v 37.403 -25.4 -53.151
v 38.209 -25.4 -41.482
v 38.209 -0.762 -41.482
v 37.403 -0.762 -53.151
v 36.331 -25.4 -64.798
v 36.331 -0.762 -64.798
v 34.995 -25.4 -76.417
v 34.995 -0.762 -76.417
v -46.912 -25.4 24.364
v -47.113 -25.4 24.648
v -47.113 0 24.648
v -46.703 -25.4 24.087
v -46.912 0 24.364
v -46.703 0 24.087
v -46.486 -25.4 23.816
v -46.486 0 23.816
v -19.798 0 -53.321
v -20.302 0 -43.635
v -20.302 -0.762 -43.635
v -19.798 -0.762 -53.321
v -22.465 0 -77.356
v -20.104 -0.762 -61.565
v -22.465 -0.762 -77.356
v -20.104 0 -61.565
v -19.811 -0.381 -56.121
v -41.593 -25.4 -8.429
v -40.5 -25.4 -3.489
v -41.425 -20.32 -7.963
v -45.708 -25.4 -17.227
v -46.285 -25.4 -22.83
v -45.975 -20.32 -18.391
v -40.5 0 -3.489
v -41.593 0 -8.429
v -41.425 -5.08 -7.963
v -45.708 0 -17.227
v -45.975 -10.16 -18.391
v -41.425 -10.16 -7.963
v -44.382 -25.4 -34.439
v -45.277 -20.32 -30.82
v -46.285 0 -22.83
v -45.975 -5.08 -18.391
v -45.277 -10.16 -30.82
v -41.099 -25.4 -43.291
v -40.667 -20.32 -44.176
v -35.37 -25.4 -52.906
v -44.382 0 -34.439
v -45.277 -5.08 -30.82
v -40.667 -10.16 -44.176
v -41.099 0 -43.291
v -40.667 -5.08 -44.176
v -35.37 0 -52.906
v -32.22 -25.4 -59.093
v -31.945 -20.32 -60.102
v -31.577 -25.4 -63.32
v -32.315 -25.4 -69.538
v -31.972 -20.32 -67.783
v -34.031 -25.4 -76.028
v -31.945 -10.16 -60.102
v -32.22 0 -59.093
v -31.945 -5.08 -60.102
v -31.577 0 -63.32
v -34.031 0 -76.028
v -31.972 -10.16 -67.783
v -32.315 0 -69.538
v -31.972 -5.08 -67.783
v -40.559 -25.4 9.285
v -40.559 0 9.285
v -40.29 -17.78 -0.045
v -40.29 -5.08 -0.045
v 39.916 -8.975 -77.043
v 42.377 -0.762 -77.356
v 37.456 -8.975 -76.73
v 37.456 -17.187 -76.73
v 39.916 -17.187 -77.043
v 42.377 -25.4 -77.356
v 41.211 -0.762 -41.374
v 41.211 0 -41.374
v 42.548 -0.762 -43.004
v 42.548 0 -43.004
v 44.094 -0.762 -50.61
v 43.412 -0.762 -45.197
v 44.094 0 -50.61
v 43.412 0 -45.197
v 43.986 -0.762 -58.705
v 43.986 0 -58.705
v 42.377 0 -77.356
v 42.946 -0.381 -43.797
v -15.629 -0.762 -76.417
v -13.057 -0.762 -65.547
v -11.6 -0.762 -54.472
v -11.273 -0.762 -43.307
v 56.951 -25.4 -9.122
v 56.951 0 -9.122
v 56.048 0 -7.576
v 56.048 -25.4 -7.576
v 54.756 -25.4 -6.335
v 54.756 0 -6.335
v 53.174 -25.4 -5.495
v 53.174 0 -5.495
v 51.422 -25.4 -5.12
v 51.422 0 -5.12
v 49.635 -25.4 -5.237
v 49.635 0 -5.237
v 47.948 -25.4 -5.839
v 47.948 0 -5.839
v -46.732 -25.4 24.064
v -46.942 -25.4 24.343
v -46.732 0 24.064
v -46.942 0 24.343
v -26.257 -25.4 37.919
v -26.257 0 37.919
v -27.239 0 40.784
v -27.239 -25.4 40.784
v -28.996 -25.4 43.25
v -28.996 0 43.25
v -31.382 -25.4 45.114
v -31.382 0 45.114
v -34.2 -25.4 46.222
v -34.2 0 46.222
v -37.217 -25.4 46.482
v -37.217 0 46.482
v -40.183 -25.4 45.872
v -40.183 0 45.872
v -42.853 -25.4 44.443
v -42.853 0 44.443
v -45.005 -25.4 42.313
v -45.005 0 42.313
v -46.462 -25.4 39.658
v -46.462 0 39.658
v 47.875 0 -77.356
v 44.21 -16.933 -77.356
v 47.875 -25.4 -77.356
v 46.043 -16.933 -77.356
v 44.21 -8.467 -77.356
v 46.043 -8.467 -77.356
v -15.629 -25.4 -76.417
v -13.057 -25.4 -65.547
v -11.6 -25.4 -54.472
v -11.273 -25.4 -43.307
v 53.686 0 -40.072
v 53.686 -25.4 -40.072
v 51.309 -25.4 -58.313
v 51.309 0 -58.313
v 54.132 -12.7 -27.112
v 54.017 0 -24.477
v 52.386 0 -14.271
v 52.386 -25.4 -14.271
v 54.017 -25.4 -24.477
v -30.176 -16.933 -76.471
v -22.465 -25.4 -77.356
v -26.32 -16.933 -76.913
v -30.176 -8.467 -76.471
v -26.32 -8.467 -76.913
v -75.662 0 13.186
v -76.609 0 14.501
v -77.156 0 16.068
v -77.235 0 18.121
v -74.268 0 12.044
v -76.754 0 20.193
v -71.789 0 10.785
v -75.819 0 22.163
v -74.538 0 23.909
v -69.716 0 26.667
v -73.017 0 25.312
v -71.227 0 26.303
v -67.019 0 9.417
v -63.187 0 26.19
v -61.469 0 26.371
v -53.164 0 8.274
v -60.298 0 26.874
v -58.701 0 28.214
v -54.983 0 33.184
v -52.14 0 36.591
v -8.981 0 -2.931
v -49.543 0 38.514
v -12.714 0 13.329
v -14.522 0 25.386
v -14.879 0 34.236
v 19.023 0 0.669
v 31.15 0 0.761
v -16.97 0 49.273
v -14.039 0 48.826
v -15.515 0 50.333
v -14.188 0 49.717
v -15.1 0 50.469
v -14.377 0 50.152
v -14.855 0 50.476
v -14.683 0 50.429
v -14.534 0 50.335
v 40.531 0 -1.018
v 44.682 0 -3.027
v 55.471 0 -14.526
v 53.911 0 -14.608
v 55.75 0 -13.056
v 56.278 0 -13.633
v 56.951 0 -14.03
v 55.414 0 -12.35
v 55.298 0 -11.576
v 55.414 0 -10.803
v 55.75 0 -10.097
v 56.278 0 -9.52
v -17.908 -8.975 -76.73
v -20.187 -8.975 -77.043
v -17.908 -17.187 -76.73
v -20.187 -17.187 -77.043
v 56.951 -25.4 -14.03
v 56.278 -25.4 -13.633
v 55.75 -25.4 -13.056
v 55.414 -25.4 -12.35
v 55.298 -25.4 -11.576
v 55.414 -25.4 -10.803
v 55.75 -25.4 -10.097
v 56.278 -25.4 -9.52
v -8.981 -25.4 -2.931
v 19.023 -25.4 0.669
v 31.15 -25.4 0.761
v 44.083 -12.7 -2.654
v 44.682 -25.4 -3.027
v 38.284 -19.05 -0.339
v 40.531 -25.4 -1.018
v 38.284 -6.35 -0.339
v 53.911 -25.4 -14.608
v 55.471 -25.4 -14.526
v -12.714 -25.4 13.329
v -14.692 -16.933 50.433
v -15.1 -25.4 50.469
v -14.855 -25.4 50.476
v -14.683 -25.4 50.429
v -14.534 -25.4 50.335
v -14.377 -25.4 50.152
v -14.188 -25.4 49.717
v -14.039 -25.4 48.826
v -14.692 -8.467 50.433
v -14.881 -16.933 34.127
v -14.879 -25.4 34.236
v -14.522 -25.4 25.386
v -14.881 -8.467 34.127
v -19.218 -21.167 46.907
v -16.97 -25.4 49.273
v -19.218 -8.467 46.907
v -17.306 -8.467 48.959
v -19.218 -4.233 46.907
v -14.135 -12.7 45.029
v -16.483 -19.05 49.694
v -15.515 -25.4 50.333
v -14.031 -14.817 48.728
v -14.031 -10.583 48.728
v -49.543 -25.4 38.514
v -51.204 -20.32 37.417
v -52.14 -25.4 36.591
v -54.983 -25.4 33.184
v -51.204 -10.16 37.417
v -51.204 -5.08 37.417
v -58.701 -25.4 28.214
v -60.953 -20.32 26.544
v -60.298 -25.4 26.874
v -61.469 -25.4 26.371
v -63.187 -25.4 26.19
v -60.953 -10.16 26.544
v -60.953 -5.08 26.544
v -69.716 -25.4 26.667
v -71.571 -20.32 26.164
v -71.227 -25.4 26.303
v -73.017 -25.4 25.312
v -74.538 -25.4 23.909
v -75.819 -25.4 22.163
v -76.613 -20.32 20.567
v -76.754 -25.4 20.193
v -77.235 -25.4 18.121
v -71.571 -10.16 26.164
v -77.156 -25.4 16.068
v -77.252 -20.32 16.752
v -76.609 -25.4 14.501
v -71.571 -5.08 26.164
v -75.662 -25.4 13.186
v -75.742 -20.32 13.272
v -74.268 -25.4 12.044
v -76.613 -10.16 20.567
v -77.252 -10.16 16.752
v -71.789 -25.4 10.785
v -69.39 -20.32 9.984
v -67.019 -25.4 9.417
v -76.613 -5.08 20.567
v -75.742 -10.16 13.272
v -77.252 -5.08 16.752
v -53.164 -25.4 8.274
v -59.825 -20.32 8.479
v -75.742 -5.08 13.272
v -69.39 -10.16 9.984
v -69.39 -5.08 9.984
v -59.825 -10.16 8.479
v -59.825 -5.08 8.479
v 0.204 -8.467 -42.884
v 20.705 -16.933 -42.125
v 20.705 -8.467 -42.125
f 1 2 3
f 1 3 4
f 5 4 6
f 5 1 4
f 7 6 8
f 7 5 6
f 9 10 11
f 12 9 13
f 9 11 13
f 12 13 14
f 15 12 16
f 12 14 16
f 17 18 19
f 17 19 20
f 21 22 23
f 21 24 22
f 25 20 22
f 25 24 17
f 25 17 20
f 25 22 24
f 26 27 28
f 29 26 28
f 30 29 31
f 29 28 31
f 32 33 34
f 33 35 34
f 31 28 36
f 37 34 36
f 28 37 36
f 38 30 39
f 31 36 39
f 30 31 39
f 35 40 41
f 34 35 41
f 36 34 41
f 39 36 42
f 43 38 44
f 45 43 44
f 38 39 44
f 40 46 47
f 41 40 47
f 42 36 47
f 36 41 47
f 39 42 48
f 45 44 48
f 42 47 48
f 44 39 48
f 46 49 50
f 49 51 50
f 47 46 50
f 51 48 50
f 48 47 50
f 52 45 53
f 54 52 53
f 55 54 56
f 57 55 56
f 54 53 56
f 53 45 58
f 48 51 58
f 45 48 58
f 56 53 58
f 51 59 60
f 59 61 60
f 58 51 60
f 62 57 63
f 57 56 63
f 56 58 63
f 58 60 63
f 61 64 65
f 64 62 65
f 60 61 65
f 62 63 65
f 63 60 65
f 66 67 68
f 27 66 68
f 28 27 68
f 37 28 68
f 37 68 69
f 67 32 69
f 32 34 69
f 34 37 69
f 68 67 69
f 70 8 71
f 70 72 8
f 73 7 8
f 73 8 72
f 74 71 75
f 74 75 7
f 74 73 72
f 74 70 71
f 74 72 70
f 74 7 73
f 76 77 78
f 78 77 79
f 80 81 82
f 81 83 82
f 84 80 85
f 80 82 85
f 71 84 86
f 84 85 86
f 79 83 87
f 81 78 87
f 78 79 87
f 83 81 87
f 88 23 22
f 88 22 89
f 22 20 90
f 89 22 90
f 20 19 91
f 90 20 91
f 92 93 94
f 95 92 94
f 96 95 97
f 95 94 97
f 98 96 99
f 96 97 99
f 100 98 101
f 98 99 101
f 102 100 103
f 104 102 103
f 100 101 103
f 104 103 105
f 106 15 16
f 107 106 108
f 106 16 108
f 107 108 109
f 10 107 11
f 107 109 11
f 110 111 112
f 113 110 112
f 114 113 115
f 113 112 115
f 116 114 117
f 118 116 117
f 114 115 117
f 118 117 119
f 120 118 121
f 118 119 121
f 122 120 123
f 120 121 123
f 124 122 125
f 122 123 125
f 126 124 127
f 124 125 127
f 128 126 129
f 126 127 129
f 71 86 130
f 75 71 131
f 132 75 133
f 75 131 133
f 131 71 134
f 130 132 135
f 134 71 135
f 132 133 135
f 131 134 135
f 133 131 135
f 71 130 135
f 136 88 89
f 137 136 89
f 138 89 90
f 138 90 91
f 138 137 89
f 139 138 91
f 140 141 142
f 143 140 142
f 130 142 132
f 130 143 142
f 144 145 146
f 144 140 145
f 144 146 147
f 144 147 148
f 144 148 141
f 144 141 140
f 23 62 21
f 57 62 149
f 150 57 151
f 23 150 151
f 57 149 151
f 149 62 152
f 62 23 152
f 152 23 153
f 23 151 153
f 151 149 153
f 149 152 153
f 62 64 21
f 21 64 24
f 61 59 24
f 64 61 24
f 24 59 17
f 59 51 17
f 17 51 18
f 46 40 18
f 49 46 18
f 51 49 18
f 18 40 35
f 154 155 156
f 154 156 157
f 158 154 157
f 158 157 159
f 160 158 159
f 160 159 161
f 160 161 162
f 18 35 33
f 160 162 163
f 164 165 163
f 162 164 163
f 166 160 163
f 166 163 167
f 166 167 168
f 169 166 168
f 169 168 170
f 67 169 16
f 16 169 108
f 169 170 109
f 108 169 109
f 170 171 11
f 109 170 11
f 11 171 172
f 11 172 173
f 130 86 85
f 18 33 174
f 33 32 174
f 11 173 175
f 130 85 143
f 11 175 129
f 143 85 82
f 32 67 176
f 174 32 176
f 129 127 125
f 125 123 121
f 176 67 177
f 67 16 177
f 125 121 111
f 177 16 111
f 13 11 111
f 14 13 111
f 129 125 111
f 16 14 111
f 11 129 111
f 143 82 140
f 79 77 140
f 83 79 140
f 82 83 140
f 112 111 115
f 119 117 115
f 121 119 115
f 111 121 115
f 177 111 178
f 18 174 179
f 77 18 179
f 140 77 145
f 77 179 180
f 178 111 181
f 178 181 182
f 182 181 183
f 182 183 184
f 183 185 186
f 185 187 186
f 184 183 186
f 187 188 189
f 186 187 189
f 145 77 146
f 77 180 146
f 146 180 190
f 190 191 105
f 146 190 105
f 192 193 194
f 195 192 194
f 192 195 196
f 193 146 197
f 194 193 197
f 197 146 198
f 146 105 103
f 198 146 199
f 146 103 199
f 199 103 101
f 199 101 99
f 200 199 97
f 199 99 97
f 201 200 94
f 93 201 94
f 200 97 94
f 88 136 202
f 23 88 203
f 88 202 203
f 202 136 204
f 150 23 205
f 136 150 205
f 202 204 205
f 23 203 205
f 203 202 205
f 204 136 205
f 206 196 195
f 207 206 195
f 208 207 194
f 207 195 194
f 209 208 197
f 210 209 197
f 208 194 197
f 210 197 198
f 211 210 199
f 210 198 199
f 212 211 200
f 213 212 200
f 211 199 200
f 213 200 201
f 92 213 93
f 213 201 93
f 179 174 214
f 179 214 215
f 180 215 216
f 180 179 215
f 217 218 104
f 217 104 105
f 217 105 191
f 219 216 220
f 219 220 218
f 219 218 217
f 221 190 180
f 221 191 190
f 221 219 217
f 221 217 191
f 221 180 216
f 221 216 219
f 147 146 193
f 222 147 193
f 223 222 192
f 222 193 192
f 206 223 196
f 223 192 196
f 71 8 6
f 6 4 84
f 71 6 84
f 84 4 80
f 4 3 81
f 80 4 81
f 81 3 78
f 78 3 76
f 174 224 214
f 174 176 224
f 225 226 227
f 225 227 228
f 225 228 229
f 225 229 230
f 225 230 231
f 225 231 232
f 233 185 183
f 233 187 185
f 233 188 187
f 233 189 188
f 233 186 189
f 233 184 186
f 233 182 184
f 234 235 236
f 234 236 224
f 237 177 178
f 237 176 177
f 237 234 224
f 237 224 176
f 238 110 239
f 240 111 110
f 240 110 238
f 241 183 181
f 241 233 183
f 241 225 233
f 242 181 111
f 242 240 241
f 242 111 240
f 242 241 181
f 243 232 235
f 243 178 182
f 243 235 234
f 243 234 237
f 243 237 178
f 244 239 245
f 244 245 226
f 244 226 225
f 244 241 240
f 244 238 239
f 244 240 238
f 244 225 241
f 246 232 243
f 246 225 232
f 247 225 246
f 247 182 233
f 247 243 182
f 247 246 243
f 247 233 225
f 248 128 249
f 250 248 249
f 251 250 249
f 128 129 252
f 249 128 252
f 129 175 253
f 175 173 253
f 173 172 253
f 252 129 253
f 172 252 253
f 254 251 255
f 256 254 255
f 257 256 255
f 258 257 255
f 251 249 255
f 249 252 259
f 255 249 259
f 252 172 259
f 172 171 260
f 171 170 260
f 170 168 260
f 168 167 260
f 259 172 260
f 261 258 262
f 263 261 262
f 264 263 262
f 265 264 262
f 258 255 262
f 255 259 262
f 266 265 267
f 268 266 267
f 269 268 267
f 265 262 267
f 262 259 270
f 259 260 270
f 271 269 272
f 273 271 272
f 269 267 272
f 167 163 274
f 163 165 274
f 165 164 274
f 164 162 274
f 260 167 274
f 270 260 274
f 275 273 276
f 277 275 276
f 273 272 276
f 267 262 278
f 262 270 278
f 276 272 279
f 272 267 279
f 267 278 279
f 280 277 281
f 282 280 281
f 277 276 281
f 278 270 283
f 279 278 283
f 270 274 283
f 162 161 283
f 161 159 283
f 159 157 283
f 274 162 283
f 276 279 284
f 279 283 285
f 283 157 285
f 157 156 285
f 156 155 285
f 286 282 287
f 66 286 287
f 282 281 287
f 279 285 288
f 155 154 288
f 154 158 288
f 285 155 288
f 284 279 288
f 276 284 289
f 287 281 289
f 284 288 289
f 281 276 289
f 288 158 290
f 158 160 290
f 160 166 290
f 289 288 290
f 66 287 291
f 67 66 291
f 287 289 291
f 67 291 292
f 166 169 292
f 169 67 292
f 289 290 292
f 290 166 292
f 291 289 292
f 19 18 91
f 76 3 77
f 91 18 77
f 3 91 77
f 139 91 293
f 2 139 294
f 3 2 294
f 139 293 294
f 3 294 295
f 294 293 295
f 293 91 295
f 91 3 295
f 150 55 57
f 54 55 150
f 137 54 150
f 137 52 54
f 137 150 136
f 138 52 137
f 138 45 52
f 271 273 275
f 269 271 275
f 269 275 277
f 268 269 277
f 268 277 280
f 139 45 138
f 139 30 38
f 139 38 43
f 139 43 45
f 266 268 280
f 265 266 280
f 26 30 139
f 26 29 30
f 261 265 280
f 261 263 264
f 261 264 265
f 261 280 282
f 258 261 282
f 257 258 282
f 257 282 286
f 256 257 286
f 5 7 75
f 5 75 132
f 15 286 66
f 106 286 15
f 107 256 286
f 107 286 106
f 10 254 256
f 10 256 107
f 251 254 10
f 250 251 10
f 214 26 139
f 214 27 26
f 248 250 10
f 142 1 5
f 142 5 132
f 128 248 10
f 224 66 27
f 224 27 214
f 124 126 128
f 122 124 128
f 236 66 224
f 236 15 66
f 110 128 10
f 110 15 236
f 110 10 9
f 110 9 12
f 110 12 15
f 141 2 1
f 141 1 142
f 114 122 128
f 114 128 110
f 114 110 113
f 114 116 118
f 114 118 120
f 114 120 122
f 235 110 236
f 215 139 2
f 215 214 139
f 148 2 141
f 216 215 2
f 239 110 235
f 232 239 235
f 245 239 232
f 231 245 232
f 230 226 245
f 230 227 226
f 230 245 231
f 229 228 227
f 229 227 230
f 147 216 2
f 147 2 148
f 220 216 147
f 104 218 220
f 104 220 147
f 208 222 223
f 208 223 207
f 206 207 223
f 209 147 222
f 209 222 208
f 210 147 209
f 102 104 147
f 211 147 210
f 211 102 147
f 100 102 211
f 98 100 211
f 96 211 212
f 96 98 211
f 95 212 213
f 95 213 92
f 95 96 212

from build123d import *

# Parameters (mm, degrees)
F1_DEPTH = 25.4
F3_DEPTH = 24.638


with BuildPart() as f1:
    # F0 (on Front) → F1 (new body)
    with BuildSketch(Plane.XZ):
        with BuildLine():
            ThreePointArc((-46.4862426009, 23.8157141108), (-29.8551050215, 21.5207532176), (-26.2572001666, 37.9194319248))
            add(Edge.make_bspline(
                [(-26.2572001666, 37.9194319248), (-33.5785732102, 39.4513797897), (-40.8999462537, 40.9833276545), (-46.4622259382, 39.6582663738)],
                knots=[0, 0, 0, 0, 0.1645686981, 0.1645686981, 0.1645686981, 0.1645686981], degree=3))
            ThreePointArc((-46.4622259382, 39.6582663738), (-46.7732025891, 33.2630857663), (-43.3209426701, 27.8707817197))
            ThreePointArc((-43.3209426701, 27.8707817197), (-42.75295438, 24.1645052215), (-46.4862426009, 23.8157141108))
        make_face()
        with BuildLine():
            add(Edge.make_bspline(
                [(-26.2572001666, 37.9194319248), (-33.5785732102, 39.4513797897), (-40.8999462537, 40.9833276545), (-46.4622259382, 39.6582663738)],
                knots=[0, 0, 0, 0, 0.1645686981, 0.1645686981, 0.1645686981, 0.1645686981], degree=3))
            ThreePointArc((-26.2572001666, 37.9194319248), (-35.699445364, 46.4610721536), (-46.4622259382, 39.6582663738))
        make_face()
        with BuildLine():
            add(Edge.make_bspline(
                [(-26.2572001666, 37.9194319248), (-21.2848663216, 44.5178757287), (-11.4483296844, 57.5712700198), (-17.1229667839, 30.8499658929), (-12.1318281567, 9.7139809287), (-8.9813978684, -2.9307255803)],
                knots=[0, 0, 0, 0, 0.2852219899, 0.5642413886, 0.9762354153, 0.9762354153, 0.9762354153, 0.9762354153], degree=3))
            ThreePointArc((-26.2572001666, 37.9194319248), (-29.8551050215, 21.5207532176), (-46.4862426009, 23.8157141108))
            ThreePointArc((-46.4862426009, 23.8157141108), (-42.75295438, 24.1645052215), (-43.3209426701, 27.8707817197))
            ThreePointArc((-43.3209426701, 27.8707817197), (-46.7732025891, 33.2630857663), (-46.4622259382, 39.6582663738))
            add(Edge.make_bspline(
                [(-46.4622259382, 39.6582663738), (-47.9546637508, 39.3027338096), (-54.4687249908, 36.6260590315), (-59.204777521, 22.3686329219), (-72.3635551118, 30.541434958), (-84.8045836551, 7.5055250894), (-50.2965651717, 7.5626151235), (-40.5588783311, 9.284645475)],
                knots=[0.1645686981, 0.1645686981, 0.1645686981, 0.1645686981, 0.2087247926, 0.3751678059, 0.5132702951, 0.669236946, 0.8887619241, 0.8887619241, 0.8887619241, 0.8887619241], degree=3))
            add(Edge.make_bspline(
                [(-40.5588783311, 9.284645475), (-40.2244215579, 2.9095372853), (-39.6152527774, -8.6489043019), (-48.9282482124, -17.6683761849), (-42.4825879873, -45.6063545007), (-29.1342983998, -58.9969255104), (-32.432355946, -70.4688856478), (-34.0306833386, -76.0284587741)],
                knots=[0, 0, 0, 0, 0.1985639192, 0.3597333515, 0.6048956396, 0.8085027208, 1, 1, 1, 1], degree=3))
            add(Edge.make_bspline(
                [(-34.0306833386, -76.0284587741), (-30.1755412171, -76.4708518982), (-26.3203990956, -76.9132450223), (-22.4652569741, -77.3556381464)],
                knots=[0, 0, 0, 0, 11.6413269037, 11.6413269037, 11.6413269037, 11.6413269037], degree=3))
            add(Edge.make_bspline(
                [(-20.3018153965, -43.6350402281), (-19.9338059871, -47.9677109939), (-19.3292219931, -60.3156512029), (-21.2182682476, -70.5799893582), (-22.4652569741, -77.3556381464)],
                knots=[0.3055460212, 0.3055460212, 0.3055460212, 0.3055460212, 0.5415801595, 1, 1, 1, 1], degree=3))
            add(Edge.make_bspline(
                [(-20.3018153965, -43.6350402281), (0.2083386626, -42.8949527825), (20.7004662969, -42.113893037), (41.2106203561, -41.3738055914)],
                knots=[0, 0, 0, 0, 61.5539839027, 61.5539839027, 61.5539839027, 61.5539839027], degree=3))
            add(Edge.make_bspline(
                [(41.2106203561, -41.3738055914), (41.8876965674, -42.0052244917), (45.5136908231, -46.3501180704), (43.8031563705, -63.2582394955), (42.3769727349, -77.3556381464)],
                knots=[0.4245594021, 0.4245594021, 0.4245594021, 0.4245594021, 0.5202178111, 1, 1, 1, 1], degree=3))
            add(Edge.make_bspline(
                [(42.3769727349, -77.3556381464), (44.2097435395, -77.3556381464), (46.0425143441, -77.3556381464), (47.8752851486, -77.3556381464)],
                knots=[0, 0, 0, 0, 5.4983124137, 5.4983124137, 5.4983124137, 5.4983124137], degree=3))
            add(Edge.make_bspline(
                [(52.3864964181, -14.2706181318), (53.5131222585, -18.0947594075), (55.5788689173, -36.43703812), (51.206238736, -59.6640147088), (47.8752851486, -77.3556381464)],
                knots=[0.5220036326, 0.5220036326, 0.5220036326, 0.5220036326, 0.6358895624, 1, 1, 1, 1], degree=3))
            ThreePointArc((52.3864964181, -14.2706181318), (49.1690411166, -11.3433428892), (48.897415601, -7.0020091607))
            add(Edge.make_bspline(
                [(47.9479525169, -5.8392007163), (48.2807380693, -6.2122010878), (48.5969884032, -6.6000410714), (48.897415601, -7.0020091607)],
                knots=[0.4248007478, 0.4248007478, 0.4248007478, 0.4248007478, 0.4405556349, 0.4405556349, 0.4405556349, 0.4405556349], degree=3))
            add(Edge.make_bspline(
                [(-8.9813978684, -2.9307255803), (12.2262396811, 0.3668984768), (36.4031082958, 4.128462424), (46.8487158168, -4.6071289077), (47.9479525169, -5.8392007163)],
                knots=[0, 0, 0, 0, 0.372760177, 0.4248007478, 0.4248007478, 0.4248007478, 0.4248007478], degree=3))
        make_face()
        with BuildLine():
            ThreePointArc((-47.1128895879, 24.6476288885), (-46.8083266273, 24.2250725526), (-46.4862426009, 23.8157141108))
            ThreePointArc((-46.4862426009, 23.8157141108), (-46.8420398942, 24.1996777433), (-47.1128895879, 24.6476288885))
        make_face(mode=Mode.SUBTRACT)
        with BuildLine():
            ThreePointArc((56.9514993654, -9.1224809065), (53.1738513822, -5.4951140517), (47.9479525169, -5.8392007163))
            add(Edge.make_bspline(
                [(47.9479525169, -5.8392007163), (48.2807380693, -6.2122010878), (48.5969884032, -6.6000410714), (48.897415601, -7.0020091607)],
                knots=[0.4248007478, 0.4248007478, 0.4248007478, 0.4248007478, 0.4405556349, 0.4405556349, 0.4405556349, 0.4405556349], degree=3))
            add(Edge.make_bspline(
                [(48.897415601, -7.0020091607), (50.4505332837, -9.0800625191), (51.580765464, -11.5357003907), (52.3864964181, -14.2706181318)],
                knots=[0.4405556349, 0.4405556349, 0.4405556349, 0.4405556349, 0.5220036326, 0.5220036326, 0.5220036326, 0.5220036326], degree=3))
            ThreePointArc((52.3864964181, -14.2706181318), (54.6937283173, -14.6199582074), (56.9514993654, -14.0301892534))
            ThreePointArc((56.9514993654, -14.0301892534), (55.2984202513, -11.5763350799), (56.9514993654, -9.1224809065))
        make_face()
        with BuildLine():
            add(Edge.make_bspline(
                [(48.897415601, -7.0020091607), (50.4505332837, -9.0800625191), (51.580765464, -11.5357003907), (52.3864964181, -14.2706181318)],
                knots=[0.4405556349, 0.4405556349, 0.4405556349, 0.4405556349, 0.5220036326, 0.5220036326, 0.5220036326, 0.5220036326], degree=3))
            ThreePointArc((48.897415601, -7.0020091607), (49.1690411166, -11.3433428892), (52.3864964181, -14.2706181318))
        make_face()
    extrude(amount=F1_DEPTH)

    # F2 (on face) → F3 (join)
    with BuildSketch(Plane.XZ.offset(25.4)):
        with BuildLine():
            ThreePointArc((-15.6290009618, -76.417055522), (-12.187807166, -60.0281077199), (-11.2726572913, -43.3068061704))
            add(Edge.make_bspline(
                [(-20.3018153965, -43.6350402281), (-17.2917457537, -43.526425015), (-14.2820643728, -43.4169273205), (-11.2726572913, -43.3068061704)],
                knots=[0, 0, 0, 0, 9.0336609762, 9.0336609762, 9.0336609762, 9.0336609762], degree=3))
            add(Edge.make_bspline(
                [(-20.3018153965, -43.6350402281), (-19.9338059871, -47.9677109939), (-19.3292219931, -60.3156512029), (-21.2182682476, -70.5799893582), (-22.4652569741, -77.3556381464)],
                knots=[0.3055460212, 0.3055460212, 0.3055460212, 0.3055460212, 0.5415801595, 1, 1, 1, 1], degree=3))
            add(Edge.make_bspline(
                [(-15.6290009618, -76.417055522), (-17.9077529659, -76.7299163968), (-20.18650497, -77.0427772716), (-22.4652569741, -77.3556381464)],
                knots=[0, 0, 0, 0, 6.9003864826, 6.9003864826, 6.9003864826, 6.9003864826], degree=3))
        make_face()
        with BuildLine():
            ThreePointArc((38.2086128765, -41.4824174773), (36.899968005, -58.9771543034), (34.9951810088, -76.417055522))
            add(Edge.make_bspline(
                [(34.9951810088, -76.417055522), (37.4557782508, -76.7299163968), (39.9163754929, -77.0427772716), (42.3769727349, -77.3556381464)],
                knots=[0, 0, 0, 0, 7.441222106, 7.441222106, 7.441222106, 7.441222106], degree=3))
            add(Edge.make_bspline(
                [(41.2106203561, -41.3738055914), (41.8876965674, -42.0052244917), (45.5136908231, -46.3501180704), (43.8031563705, -63.2582394955), (42.3769727349, -77.3556381464)],
                knots=[0.4245594021, 0.4245594021, 0.4245594021, 0.4245594021, 0.5202178111, 1, 1, 1, 1], degree=3))
            add(Edge.make_bspline(
                [(38.2086128765, -41.4824174773), (39.2092419151, -41.4461223236), (40.2099096791, -41.409915189), (41.2106203561, -41.3738055914)],
                knots=[58.5507042235, 58.5507042235, 58.5507042235, 58.5507042235, 61.5539839027, 61.5539839027, 61.5539839027, 61.5539839027], degree=3))
        make_face()
    extrude(amount=-F3_DEPTH)


solid = f1.part
